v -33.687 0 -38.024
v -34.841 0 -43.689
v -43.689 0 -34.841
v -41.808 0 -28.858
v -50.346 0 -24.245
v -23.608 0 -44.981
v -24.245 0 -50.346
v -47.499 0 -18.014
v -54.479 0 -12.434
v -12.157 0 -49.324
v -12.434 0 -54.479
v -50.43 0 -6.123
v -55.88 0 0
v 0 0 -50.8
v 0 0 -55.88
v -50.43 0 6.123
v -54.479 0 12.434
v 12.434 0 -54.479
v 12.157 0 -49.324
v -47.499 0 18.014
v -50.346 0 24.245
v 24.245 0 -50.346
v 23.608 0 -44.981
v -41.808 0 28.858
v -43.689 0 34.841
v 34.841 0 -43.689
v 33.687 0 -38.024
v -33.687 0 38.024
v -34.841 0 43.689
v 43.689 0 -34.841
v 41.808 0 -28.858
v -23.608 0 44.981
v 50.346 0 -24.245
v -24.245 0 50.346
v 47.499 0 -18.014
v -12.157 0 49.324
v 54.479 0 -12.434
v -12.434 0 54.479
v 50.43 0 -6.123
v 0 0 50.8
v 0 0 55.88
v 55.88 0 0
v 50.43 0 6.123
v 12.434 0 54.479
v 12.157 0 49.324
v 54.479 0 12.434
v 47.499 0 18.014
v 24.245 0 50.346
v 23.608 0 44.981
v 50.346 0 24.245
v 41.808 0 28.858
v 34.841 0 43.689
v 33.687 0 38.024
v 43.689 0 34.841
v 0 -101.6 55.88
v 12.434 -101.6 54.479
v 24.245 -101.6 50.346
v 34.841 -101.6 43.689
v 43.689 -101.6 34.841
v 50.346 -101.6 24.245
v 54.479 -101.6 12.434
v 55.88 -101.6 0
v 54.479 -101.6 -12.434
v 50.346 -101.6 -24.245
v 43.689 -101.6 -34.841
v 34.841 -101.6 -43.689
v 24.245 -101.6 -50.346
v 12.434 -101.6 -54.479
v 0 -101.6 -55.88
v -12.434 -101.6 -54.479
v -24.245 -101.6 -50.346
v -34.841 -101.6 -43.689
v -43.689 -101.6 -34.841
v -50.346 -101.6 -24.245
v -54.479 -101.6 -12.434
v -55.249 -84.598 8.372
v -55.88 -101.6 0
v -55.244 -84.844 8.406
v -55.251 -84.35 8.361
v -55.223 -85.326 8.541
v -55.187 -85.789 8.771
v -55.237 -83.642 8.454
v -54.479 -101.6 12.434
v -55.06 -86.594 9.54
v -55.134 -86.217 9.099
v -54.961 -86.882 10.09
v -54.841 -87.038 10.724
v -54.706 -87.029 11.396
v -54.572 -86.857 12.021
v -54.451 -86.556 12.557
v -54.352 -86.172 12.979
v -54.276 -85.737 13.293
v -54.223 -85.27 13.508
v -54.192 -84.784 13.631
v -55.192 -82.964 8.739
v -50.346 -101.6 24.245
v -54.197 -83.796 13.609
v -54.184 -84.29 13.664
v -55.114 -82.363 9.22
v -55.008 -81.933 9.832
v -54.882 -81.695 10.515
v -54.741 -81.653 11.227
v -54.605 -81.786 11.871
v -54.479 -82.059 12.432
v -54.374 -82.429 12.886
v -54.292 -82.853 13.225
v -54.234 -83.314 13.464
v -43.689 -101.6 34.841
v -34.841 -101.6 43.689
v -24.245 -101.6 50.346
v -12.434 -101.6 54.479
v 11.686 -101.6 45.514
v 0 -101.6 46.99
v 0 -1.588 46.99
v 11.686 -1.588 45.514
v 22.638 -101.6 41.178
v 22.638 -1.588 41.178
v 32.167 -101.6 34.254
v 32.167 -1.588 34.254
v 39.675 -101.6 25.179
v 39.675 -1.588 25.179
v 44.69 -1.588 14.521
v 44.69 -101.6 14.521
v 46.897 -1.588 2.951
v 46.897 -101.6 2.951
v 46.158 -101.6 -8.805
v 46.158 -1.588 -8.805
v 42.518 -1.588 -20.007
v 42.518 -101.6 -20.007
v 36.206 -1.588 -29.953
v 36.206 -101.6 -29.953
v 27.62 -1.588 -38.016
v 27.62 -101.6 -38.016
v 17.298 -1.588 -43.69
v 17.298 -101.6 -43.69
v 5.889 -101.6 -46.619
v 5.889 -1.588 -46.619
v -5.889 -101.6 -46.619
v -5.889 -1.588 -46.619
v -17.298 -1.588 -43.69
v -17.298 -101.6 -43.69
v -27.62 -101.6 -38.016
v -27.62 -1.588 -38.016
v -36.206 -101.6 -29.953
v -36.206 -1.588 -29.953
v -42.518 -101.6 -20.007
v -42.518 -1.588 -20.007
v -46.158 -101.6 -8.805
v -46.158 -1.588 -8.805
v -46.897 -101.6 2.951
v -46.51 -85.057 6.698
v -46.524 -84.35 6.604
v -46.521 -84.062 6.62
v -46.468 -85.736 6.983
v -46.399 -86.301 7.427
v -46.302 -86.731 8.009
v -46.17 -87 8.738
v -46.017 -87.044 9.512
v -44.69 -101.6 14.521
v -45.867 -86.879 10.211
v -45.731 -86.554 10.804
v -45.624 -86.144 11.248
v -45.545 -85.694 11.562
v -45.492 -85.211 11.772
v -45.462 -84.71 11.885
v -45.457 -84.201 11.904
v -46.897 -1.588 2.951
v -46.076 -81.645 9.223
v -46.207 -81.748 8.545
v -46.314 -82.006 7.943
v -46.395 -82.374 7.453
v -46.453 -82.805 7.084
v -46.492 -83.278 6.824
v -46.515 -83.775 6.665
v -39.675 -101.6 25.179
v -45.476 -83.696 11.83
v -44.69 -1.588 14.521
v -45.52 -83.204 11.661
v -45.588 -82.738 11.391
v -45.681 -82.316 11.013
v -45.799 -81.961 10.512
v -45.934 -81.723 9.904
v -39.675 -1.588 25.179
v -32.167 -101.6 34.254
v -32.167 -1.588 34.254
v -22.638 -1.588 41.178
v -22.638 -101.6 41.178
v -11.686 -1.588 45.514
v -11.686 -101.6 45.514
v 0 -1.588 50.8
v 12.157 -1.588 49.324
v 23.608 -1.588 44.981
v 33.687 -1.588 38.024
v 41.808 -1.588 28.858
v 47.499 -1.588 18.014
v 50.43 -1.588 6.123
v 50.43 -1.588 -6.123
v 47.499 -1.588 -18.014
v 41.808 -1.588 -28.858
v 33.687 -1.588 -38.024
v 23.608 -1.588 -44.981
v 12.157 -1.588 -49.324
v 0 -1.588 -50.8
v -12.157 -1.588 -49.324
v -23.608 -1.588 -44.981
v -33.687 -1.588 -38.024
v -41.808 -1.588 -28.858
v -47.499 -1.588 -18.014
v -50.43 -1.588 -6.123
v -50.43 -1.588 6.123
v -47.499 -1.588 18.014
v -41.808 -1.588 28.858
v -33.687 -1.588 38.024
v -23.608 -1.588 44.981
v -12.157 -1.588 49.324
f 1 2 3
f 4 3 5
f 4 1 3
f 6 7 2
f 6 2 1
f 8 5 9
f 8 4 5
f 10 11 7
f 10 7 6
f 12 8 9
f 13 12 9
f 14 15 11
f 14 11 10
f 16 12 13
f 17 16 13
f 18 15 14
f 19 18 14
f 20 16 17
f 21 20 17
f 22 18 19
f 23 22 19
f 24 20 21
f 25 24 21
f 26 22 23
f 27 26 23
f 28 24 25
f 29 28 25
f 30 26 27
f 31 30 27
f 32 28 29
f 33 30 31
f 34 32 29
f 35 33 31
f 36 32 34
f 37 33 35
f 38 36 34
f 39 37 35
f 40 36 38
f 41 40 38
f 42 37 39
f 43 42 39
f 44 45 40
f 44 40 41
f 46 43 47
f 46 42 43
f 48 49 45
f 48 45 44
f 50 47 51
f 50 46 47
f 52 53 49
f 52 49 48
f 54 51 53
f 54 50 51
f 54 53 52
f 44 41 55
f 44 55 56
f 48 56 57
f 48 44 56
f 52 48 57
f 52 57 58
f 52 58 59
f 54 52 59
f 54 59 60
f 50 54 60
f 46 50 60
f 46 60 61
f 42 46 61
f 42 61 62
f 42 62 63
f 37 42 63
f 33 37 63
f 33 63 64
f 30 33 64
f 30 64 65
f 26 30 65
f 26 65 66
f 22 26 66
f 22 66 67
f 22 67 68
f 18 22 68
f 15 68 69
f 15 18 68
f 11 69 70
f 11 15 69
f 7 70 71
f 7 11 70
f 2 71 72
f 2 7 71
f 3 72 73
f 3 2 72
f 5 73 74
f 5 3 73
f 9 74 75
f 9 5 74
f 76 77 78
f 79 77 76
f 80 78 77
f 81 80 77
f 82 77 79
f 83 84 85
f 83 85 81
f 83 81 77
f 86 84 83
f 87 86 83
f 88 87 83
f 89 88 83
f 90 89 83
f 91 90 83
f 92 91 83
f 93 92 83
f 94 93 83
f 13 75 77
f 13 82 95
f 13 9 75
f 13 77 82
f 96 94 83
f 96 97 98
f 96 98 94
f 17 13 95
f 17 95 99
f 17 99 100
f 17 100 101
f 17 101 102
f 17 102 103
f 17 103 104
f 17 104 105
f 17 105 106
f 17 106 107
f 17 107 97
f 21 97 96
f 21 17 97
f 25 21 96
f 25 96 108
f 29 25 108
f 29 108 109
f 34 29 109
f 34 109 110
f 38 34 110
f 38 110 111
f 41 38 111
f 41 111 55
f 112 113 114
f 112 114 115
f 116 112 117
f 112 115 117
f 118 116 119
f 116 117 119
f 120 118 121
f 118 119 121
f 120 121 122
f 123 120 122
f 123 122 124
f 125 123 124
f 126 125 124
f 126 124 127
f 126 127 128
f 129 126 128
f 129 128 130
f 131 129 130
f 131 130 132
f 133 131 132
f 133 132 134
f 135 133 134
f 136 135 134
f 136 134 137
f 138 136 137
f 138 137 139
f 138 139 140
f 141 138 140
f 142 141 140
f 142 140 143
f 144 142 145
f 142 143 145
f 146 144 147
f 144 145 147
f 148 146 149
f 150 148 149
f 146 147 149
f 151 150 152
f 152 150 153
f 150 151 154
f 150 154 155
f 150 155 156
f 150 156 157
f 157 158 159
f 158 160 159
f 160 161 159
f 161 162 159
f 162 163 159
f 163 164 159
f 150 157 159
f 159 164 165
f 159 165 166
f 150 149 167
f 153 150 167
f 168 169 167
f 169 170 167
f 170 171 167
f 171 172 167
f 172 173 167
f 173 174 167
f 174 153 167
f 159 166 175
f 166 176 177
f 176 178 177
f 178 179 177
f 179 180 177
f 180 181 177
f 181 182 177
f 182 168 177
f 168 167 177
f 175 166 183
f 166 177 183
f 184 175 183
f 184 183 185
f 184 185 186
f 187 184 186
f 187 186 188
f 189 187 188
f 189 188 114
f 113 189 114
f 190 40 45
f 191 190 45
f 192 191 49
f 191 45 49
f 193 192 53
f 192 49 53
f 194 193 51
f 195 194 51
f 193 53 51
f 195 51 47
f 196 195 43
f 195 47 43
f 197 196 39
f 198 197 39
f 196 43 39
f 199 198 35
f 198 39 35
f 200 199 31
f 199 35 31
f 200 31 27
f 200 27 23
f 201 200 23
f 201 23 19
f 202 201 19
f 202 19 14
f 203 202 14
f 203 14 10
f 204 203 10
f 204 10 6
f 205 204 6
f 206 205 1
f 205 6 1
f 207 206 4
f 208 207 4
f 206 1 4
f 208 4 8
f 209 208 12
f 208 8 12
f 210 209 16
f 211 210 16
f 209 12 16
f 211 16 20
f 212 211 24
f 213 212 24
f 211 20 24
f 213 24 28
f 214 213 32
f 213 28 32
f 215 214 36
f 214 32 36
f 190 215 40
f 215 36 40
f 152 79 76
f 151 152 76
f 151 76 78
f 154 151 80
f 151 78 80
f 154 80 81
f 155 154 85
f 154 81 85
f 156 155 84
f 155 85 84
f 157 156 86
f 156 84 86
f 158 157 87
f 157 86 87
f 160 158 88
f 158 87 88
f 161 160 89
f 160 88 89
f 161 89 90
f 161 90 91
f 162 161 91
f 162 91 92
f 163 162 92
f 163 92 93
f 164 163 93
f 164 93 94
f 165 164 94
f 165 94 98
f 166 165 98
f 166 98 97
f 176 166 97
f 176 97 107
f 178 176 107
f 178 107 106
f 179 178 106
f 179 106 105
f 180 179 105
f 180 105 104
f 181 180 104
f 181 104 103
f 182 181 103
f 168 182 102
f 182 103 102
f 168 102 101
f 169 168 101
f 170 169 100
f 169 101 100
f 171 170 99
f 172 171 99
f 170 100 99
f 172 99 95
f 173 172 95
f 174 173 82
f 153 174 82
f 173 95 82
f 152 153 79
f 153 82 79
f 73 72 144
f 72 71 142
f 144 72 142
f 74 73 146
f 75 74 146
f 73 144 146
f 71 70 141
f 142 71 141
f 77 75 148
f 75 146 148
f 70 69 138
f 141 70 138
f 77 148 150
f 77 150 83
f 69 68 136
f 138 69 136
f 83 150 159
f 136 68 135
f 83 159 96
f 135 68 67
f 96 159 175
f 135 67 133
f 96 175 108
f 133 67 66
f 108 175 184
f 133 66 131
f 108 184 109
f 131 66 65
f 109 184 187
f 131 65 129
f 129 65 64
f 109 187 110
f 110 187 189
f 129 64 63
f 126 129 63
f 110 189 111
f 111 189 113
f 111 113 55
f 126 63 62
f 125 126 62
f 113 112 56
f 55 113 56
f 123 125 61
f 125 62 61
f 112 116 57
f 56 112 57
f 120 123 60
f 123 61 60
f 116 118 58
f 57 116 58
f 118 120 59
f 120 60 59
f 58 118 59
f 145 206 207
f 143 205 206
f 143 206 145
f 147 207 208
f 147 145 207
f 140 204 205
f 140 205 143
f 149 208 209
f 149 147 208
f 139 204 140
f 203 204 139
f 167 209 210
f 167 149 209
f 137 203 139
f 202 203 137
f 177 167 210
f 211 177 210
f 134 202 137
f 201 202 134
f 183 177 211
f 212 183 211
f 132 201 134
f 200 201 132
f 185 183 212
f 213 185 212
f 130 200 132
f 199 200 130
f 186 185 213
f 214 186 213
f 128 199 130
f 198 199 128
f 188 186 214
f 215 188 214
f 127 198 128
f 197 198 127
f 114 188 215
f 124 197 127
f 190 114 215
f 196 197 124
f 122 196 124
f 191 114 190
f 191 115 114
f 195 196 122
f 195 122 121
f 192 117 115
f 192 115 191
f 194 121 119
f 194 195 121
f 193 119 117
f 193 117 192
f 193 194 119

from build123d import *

# Parameters (mm, degrees)
SKETCH1_R                    = 55.88
SKETCH1_R_2                  = 46.99
BOSS_EXTRUDE4_DEPTH          = 101.6
SKETCH3_R                    = 50.8
CUT_EXTRUDE3_DEPTH           = 1.5875
F_1_4_28_TAPPED_HOLE1_REACH  = 156.393
F_1_4_28_TAPPED_HOLE1_BORE_R = 2.7051


with BuildPart() as part:
    # Sketch1 → Boss-Extrude4 (new body)
    with BuildSketch(Plane(origin=(0, 0, 0), x_dir=(1, 0, 0), z_dir=(0, 1, 0))):
        with Locations(Location((0, 0, 0), (0, 0, 270))):
            Circle(SKETCH1_R)
        with Locations(Location((0, 0, 0), (0, 0, 270))):
            Circle(SKETCH1_R_2, mode=Mode.SUBTRACT)
    extrude(amount=-BOSS_EXTRUDE4_DEPTH)

    # Sketch3 → Cut-Extrude3 (cut)
    with BuildSketch(Plane(origin=(0, 0, 0), x_dir=(1, 0, 0), z_dir=(0, 1, 0))):
        with Locations(Location((0, 0, 0), (0, 0, 270))):
            Circle(SKETCH3_R)
    extrude(amount=-CUT_EXTRUDE3_DEPTH, mode=Mode.SUBTRACT)

    # 1/4-28 Tapped Hole1 bore (on position points) → 1/4-28 Tapped Hole1 (cut, up to next)
    with BuildSketch(Plane(origin=(-54.781474323, -84.349985228, 11.025627917), x_dir=(-0.197309017847, 0, -0.980341344368), z_dir=(-0.980341344368, 0, 0.197309017847)), mode=Mode.PRIVATE) as f_1_4_28_tapped_hole1_sk1:
        Circle(F_1_4_28_TAPPED_HOLE1_BORE_R)
    f_1_4_28_tapped_hole1_tool1 = extrude(f_1_4_28_tapped_hole1_sk1.sketch, amount=-F_1_4_28_TAPPED_HOLE1_REACH, mode=Mode.PRIVATE) & part.part
    add(f_1_4_28_tapped_hole1_tool1.solids().sort_by_distance((-54.781474, -84.349985, 11.025628))[0], mode=Mode.SUBTRACT)


solid = part.part
